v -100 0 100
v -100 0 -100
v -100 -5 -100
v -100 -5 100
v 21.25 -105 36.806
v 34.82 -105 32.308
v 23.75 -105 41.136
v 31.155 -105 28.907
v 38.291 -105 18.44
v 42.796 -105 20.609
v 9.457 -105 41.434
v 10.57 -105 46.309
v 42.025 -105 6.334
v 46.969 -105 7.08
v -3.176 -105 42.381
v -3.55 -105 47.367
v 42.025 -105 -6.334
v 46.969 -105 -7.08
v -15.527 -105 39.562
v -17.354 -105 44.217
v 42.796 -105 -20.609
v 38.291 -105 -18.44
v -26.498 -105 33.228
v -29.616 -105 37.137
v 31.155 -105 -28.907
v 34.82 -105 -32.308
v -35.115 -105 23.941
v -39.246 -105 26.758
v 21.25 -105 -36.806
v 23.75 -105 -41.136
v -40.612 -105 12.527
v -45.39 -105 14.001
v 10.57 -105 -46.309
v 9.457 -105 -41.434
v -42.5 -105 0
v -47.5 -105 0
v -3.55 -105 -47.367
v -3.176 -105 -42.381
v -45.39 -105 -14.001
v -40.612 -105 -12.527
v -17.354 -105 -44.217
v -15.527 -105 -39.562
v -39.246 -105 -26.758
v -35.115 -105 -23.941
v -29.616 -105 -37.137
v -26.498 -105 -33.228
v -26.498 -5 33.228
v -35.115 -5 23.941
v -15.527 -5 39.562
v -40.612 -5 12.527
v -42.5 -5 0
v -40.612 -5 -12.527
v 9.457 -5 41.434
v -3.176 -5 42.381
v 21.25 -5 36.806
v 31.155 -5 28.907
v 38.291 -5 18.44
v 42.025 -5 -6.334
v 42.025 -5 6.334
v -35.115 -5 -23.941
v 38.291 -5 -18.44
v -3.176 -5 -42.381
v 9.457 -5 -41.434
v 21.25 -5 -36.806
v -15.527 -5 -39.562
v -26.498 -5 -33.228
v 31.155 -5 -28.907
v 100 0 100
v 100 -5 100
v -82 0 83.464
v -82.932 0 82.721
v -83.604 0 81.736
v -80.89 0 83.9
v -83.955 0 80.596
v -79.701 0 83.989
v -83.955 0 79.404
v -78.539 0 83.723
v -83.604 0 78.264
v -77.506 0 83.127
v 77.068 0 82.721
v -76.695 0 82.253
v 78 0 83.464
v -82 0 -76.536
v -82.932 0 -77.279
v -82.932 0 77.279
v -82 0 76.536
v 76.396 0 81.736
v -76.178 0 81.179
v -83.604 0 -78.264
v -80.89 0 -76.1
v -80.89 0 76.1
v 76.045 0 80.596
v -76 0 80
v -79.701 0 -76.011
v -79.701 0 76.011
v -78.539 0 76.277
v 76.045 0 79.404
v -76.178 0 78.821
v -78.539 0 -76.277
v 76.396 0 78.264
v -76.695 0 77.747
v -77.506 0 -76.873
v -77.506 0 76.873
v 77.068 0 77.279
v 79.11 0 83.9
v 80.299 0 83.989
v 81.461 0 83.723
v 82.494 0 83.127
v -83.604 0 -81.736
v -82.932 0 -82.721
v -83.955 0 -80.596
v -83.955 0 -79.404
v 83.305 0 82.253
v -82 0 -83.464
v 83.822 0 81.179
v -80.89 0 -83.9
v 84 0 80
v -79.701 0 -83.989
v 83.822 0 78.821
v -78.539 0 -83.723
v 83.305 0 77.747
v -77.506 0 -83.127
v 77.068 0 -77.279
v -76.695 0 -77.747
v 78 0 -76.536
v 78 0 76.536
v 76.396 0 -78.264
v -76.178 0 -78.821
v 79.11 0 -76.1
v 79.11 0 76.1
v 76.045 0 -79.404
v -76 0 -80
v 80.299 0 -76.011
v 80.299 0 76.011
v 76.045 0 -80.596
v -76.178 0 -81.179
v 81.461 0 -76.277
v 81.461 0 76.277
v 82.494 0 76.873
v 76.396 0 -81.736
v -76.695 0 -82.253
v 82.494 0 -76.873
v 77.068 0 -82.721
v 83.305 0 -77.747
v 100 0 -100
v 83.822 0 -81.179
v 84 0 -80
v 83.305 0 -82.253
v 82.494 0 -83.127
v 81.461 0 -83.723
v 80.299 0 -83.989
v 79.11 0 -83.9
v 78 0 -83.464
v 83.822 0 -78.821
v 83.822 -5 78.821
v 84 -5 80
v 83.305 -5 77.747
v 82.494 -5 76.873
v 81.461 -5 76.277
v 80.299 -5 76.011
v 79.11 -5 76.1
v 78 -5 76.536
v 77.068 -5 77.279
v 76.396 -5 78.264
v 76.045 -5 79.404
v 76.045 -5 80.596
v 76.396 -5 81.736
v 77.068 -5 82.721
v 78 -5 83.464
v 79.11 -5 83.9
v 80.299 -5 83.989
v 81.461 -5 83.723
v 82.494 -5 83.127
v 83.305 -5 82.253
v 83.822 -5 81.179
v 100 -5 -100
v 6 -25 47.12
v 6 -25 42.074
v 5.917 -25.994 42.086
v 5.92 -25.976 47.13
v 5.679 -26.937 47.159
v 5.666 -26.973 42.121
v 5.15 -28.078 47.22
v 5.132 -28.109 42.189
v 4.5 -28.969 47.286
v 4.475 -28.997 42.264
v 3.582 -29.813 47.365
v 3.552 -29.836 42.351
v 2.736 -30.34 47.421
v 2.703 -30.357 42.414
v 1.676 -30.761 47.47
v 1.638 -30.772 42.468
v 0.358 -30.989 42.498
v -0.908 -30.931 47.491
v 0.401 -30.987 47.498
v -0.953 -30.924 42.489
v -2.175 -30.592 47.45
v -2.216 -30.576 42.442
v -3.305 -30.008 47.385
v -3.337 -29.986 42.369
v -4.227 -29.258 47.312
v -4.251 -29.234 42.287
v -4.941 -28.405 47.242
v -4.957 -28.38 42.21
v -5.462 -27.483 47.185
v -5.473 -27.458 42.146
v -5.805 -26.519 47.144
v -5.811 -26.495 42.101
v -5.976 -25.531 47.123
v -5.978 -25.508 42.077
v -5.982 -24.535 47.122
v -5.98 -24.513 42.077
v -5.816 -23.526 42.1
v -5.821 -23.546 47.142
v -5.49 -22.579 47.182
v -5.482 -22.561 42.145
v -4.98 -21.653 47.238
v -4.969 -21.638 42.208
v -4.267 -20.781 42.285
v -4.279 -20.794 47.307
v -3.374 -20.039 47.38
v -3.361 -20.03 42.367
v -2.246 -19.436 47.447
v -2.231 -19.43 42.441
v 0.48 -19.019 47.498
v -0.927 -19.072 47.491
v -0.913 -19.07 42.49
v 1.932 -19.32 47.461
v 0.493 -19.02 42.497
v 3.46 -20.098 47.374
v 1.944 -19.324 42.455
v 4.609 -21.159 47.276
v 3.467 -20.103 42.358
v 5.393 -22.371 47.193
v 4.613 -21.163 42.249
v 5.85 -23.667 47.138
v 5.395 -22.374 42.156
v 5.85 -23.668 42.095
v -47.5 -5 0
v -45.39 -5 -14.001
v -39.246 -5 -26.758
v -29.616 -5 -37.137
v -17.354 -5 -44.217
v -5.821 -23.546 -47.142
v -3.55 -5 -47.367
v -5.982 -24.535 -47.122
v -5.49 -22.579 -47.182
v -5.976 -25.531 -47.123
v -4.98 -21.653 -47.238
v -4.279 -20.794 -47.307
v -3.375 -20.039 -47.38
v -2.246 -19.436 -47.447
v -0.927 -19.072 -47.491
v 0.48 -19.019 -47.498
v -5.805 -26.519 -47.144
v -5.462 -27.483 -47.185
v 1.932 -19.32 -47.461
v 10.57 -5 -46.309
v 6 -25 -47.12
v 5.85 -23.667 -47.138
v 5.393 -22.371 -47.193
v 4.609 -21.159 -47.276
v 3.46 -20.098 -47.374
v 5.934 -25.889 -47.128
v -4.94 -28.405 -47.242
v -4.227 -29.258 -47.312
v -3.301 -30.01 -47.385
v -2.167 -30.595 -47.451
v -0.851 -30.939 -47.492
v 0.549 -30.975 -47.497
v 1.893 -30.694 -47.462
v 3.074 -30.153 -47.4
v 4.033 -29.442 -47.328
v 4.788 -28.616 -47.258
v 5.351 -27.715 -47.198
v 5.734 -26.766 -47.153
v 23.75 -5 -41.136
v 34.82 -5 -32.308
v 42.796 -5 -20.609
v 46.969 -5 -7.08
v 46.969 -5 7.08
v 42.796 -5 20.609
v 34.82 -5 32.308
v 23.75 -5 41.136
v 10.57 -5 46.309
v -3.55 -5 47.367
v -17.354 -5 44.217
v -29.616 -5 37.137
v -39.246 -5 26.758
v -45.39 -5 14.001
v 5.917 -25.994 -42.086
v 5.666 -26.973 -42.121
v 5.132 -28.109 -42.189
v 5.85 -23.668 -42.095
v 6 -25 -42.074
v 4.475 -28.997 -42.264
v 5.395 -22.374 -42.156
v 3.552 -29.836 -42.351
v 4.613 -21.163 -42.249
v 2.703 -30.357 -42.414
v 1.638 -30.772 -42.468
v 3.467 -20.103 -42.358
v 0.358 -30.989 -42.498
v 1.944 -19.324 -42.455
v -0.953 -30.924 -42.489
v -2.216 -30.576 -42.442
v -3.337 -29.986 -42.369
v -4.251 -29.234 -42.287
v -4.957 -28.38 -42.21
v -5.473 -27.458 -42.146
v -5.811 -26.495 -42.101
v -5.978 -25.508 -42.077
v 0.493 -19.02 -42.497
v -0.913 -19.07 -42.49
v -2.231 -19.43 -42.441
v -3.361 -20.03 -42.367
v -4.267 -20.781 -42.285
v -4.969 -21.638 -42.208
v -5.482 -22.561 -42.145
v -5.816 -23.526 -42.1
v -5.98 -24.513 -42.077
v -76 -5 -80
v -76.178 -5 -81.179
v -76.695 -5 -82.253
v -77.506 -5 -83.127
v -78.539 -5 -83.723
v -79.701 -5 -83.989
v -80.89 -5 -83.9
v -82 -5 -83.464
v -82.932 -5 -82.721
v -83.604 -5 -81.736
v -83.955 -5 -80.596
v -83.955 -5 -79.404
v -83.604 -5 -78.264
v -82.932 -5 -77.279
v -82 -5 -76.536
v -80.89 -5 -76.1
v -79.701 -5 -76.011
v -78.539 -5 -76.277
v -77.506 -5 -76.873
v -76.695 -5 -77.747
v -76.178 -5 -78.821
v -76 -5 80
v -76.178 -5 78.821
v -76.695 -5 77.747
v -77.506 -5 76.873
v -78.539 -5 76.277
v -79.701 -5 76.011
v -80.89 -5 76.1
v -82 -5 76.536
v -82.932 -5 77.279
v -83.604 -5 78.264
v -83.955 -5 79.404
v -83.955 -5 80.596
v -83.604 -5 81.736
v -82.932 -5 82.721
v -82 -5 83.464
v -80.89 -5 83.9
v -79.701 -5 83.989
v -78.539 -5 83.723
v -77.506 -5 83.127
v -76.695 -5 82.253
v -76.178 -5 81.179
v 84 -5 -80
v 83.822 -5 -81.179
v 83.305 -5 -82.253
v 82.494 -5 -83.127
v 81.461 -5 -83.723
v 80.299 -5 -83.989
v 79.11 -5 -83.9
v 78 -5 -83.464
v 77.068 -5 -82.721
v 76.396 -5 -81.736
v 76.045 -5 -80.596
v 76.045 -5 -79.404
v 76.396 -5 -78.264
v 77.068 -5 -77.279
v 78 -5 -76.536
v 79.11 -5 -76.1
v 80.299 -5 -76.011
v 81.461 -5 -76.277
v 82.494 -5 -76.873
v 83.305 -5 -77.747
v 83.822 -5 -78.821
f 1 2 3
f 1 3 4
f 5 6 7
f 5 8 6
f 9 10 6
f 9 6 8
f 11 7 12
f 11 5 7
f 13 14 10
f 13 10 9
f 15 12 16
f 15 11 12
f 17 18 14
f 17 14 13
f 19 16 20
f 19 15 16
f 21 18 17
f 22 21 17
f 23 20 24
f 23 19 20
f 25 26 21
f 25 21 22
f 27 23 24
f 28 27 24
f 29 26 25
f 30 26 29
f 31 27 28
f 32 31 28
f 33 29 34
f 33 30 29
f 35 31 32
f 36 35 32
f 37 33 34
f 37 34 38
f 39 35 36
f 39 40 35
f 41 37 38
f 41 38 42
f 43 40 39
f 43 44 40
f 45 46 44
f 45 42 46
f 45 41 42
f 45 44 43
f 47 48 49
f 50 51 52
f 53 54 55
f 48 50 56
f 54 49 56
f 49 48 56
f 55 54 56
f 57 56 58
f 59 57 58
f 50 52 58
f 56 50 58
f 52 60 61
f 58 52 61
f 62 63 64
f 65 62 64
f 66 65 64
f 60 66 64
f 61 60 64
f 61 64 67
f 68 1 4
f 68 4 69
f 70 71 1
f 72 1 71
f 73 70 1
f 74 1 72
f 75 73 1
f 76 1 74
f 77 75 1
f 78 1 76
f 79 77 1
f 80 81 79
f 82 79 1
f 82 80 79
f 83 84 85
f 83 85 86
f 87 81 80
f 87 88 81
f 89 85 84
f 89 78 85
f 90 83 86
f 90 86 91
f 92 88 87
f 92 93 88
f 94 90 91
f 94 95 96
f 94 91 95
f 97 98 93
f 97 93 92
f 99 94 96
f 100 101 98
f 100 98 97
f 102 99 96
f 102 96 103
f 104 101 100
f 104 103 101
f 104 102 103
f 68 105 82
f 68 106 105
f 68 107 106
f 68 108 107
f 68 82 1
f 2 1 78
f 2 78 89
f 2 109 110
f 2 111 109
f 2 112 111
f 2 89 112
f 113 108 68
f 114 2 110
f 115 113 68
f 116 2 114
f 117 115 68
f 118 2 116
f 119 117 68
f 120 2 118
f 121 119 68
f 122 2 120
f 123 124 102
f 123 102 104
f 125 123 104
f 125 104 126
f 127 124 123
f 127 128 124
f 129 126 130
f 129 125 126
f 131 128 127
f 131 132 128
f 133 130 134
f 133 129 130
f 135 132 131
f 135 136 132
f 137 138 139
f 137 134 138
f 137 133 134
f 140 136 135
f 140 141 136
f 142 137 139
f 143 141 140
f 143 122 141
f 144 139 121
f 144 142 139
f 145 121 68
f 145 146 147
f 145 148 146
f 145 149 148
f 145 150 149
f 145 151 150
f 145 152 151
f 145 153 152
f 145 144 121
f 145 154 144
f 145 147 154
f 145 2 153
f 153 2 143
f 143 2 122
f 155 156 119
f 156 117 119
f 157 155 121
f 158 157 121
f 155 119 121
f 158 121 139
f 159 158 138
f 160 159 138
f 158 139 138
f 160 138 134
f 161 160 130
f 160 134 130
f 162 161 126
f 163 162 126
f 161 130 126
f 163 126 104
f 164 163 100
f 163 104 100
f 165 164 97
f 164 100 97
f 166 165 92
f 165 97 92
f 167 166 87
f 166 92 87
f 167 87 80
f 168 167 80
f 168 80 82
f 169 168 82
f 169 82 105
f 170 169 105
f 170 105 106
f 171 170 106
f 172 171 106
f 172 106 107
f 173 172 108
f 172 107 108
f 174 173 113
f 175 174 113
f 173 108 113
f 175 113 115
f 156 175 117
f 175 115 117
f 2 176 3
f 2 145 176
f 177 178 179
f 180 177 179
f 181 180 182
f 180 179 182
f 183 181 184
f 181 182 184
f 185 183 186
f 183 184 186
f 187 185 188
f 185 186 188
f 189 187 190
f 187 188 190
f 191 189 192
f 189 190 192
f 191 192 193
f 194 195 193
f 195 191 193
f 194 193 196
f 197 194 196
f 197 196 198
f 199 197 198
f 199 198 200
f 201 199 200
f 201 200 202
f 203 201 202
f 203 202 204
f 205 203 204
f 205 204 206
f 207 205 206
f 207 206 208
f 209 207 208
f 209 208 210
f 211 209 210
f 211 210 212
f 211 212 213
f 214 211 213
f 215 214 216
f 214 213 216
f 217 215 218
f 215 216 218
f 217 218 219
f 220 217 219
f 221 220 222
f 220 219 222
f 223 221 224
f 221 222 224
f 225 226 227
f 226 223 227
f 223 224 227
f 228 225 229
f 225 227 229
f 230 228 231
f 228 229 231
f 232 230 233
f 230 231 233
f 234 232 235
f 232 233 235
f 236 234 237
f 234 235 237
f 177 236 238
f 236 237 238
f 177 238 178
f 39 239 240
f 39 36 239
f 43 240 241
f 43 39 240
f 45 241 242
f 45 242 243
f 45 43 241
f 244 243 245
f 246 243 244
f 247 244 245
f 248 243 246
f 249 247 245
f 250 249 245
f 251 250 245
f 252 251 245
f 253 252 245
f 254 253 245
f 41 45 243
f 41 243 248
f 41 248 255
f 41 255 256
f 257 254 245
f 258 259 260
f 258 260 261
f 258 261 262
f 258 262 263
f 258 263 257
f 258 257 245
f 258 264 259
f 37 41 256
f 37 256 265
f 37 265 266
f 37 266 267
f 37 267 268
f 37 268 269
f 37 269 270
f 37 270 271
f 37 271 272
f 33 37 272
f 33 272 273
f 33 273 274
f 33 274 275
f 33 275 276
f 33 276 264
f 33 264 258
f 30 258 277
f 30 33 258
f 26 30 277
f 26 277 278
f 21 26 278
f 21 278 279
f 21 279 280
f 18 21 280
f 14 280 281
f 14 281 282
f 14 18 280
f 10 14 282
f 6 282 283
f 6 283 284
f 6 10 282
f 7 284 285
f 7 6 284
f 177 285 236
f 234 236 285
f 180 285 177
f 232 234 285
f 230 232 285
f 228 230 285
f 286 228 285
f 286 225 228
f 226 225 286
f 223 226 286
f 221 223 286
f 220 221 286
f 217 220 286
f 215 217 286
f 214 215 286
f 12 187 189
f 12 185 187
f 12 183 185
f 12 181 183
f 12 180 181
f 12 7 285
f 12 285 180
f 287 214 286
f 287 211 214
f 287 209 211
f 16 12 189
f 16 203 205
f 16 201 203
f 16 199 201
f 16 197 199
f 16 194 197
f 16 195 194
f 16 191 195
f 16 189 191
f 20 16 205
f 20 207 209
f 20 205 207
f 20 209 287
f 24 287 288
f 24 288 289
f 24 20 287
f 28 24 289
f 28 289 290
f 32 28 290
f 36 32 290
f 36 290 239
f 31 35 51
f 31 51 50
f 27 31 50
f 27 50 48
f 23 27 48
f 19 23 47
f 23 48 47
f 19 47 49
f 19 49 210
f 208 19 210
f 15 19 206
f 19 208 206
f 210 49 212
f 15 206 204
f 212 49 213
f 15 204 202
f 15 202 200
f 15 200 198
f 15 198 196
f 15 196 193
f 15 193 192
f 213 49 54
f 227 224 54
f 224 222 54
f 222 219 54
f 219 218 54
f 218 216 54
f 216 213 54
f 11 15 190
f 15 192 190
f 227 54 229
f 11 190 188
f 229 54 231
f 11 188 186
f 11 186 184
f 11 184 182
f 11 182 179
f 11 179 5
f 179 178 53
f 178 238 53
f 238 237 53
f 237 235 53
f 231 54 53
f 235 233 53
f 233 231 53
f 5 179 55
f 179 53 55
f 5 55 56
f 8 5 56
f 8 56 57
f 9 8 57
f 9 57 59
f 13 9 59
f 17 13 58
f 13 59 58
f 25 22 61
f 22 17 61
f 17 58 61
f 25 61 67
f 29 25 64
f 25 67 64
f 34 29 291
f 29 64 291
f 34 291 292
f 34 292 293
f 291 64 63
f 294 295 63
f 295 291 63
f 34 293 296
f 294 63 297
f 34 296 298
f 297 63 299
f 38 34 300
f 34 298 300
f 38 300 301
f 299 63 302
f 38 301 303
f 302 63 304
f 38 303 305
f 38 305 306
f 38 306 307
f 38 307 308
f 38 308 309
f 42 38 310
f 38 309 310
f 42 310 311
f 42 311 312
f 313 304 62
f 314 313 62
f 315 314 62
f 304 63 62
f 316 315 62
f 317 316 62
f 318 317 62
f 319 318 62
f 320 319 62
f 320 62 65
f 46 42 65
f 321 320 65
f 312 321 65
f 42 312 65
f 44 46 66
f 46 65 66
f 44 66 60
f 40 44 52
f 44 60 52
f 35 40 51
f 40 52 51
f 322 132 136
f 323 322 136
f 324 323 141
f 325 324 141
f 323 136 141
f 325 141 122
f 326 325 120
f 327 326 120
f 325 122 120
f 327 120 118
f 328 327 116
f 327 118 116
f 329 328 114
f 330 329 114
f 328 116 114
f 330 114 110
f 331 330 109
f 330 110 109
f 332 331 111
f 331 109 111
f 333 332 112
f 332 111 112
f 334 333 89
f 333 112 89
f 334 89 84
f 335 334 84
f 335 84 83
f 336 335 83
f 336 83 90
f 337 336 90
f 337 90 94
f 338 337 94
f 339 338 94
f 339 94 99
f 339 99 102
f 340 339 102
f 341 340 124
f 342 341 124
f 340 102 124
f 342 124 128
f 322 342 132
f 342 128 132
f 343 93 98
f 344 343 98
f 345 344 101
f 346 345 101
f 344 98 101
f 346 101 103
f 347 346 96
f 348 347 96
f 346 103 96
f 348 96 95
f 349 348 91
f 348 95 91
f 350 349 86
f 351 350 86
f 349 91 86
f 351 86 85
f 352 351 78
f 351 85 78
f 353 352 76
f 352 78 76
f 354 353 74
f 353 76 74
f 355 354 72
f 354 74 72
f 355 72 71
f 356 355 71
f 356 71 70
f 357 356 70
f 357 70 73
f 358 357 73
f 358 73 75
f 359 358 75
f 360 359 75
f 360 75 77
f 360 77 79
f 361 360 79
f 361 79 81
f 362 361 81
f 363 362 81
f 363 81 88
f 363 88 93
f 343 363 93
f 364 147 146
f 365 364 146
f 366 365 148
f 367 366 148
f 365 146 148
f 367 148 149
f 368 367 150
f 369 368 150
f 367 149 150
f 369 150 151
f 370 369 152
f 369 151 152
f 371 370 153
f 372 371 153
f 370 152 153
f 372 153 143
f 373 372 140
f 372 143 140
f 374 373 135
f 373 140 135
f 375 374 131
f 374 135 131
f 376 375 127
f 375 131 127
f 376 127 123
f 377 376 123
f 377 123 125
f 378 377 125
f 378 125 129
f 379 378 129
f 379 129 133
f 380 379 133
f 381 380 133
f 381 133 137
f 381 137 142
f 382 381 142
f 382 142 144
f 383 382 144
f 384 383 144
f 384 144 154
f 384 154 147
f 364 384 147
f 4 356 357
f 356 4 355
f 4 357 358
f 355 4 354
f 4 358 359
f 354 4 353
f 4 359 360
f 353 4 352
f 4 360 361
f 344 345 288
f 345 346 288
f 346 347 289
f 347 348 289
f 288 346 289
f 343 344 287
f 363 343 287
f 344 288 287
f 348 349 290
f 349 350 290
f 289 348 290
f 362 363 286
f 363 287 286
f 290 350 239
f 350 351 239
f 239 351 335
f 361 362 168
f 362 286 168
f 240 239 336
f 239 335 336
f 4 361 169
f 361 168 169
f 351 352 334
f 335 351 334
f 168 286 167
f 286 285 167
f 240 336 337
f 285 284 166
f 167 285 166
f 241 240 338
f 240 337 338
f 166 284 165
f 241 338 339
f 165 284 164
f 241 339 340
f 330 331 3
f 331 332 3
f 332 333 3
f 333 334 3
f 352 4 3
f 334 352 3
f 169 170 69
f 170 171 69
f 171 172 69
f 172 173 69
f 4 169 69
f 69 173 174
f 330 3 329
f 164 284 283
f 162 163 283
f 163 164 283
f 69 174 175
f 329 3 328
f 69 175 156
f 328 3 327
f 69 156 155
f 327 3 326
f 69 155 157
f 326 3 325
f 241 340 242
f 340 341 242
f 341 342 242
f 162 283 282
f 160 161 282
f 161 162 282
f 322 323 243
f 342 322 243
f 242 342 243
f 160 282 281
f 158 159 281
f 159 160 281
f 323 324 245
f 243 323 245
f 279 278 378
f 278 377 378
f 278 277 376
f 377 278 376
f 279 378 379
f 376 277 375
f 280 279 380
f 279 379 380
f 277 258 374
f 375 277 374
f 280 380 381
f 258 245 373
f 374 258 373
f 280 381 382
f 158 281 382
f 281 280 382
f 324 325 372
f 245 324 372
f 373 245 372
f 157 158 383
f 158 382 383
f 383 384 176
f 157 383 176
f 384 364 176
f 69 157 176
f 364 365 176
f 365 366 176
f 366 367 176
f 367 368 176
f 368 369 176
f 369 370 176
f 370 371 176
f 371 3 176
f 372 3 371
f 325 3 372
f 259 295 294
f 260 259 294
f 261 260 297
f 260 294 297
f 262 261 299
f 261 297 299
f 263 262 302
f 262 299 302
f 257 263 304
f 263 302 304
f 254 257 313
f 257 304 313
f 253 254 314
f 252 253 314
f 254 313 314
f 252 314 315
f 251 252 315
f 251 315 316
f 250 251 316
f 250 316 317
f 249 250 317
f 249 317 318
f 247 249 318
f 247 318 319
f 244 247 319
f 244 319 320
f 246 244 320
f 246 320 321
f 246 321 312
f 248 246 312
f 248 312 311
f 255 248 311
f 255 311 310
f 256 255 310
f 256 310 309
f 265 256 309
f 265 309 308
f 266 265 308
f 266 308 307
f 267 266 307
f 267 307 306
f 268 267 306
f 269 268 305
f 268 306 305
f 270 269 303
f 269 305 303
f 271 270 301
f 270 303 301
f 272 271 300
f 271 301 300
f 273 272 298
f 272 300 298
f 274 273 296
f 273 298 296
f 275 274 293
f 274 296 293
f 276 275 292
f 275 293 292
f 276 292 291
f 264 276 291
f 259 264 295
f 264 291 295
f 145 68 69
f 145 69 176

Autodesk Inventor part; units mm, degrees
ref_plane "YZ Plane" through (0, 0, 0) normal (1, 0, 0) x (0, 1, 0)
ref_plane "XZ Plane" through (0, 0, 0) normal (0, 1, 0) x (-1, 0, 0)
ref_plane "XY Plane" through (0, 0, 0) normal (0, 0, 1) x (1, 0, 0)
sketch "スケッチ1" plane through (0, 0, 0) normal (0, 0, 1) x (1, 0, 0)
  line L0 (0, 0) -> (0, -111.3423) construction
  line L1 (-42.5, 0) -> (-47.5, 0)
  line L2 (-47.5, 0) -> (-47.5, -105)
  line L3 (-47.5, -105) -> (-42.5, -105)
  line L4 (-42.5, -105) -> (-42.5, 0)
  dimension "d0" = 105
  dimension "d1" = 5
  dimension "d2" = 47.5
revolve "回転1" add sketch "スケッチ1" angle 360 about axis through (0, 0, 0) along (0, -1, 0)
sketch "スケッチ2" plane through (0, 0, 0) normal (0, 1, 0) x (1, 0, 0)
  circle A0 centre (0, 0) radius 42.5 projected
  line L0 (100, 100) -> (-100, 100)
  line L1 (-100, 100) -> (-100, -100)
  line L2 (-100, -100) -> (100, -100)
  line L3 (100, -100) -> (100, 100)
  line L4 (100, 100) -> (-100, -100) construction
  line L5 (-100, 100) -> (100, -100) construction
  circle A1 centre (80, -80) radius 4
  circle A2 centre (80, 80) radius 4
  circle A3 centre (-80, 80) radius 4
  circle A4 centre (-80, -80) radius 4
  dimension "d4" = 200
  dimension "d7" = 8
  dimension "d8" = 20
  dimension "d11" = 360
extrude "押し出し1" add sketch "スケッチ2" against normal blind 5 contours A0 | L3 L2 L1 L0
sketch "スケッチ3" plane through (0, 0, 0) normal (0, 0, 1) x (1, 0, 0)
  circle A0 centre (0, -25) radius 6
  line L0 (42.5, -5) -> (-42.5, -5) projected
  point P0 (0, 0)
  dimension "d13" = 12
  dimension "d14" = 20
extrude "押し出し2" cut sketch "スケッチ3" along normal through all both and the other way through all
properties part number "Wind Trubin Turbine Base"
